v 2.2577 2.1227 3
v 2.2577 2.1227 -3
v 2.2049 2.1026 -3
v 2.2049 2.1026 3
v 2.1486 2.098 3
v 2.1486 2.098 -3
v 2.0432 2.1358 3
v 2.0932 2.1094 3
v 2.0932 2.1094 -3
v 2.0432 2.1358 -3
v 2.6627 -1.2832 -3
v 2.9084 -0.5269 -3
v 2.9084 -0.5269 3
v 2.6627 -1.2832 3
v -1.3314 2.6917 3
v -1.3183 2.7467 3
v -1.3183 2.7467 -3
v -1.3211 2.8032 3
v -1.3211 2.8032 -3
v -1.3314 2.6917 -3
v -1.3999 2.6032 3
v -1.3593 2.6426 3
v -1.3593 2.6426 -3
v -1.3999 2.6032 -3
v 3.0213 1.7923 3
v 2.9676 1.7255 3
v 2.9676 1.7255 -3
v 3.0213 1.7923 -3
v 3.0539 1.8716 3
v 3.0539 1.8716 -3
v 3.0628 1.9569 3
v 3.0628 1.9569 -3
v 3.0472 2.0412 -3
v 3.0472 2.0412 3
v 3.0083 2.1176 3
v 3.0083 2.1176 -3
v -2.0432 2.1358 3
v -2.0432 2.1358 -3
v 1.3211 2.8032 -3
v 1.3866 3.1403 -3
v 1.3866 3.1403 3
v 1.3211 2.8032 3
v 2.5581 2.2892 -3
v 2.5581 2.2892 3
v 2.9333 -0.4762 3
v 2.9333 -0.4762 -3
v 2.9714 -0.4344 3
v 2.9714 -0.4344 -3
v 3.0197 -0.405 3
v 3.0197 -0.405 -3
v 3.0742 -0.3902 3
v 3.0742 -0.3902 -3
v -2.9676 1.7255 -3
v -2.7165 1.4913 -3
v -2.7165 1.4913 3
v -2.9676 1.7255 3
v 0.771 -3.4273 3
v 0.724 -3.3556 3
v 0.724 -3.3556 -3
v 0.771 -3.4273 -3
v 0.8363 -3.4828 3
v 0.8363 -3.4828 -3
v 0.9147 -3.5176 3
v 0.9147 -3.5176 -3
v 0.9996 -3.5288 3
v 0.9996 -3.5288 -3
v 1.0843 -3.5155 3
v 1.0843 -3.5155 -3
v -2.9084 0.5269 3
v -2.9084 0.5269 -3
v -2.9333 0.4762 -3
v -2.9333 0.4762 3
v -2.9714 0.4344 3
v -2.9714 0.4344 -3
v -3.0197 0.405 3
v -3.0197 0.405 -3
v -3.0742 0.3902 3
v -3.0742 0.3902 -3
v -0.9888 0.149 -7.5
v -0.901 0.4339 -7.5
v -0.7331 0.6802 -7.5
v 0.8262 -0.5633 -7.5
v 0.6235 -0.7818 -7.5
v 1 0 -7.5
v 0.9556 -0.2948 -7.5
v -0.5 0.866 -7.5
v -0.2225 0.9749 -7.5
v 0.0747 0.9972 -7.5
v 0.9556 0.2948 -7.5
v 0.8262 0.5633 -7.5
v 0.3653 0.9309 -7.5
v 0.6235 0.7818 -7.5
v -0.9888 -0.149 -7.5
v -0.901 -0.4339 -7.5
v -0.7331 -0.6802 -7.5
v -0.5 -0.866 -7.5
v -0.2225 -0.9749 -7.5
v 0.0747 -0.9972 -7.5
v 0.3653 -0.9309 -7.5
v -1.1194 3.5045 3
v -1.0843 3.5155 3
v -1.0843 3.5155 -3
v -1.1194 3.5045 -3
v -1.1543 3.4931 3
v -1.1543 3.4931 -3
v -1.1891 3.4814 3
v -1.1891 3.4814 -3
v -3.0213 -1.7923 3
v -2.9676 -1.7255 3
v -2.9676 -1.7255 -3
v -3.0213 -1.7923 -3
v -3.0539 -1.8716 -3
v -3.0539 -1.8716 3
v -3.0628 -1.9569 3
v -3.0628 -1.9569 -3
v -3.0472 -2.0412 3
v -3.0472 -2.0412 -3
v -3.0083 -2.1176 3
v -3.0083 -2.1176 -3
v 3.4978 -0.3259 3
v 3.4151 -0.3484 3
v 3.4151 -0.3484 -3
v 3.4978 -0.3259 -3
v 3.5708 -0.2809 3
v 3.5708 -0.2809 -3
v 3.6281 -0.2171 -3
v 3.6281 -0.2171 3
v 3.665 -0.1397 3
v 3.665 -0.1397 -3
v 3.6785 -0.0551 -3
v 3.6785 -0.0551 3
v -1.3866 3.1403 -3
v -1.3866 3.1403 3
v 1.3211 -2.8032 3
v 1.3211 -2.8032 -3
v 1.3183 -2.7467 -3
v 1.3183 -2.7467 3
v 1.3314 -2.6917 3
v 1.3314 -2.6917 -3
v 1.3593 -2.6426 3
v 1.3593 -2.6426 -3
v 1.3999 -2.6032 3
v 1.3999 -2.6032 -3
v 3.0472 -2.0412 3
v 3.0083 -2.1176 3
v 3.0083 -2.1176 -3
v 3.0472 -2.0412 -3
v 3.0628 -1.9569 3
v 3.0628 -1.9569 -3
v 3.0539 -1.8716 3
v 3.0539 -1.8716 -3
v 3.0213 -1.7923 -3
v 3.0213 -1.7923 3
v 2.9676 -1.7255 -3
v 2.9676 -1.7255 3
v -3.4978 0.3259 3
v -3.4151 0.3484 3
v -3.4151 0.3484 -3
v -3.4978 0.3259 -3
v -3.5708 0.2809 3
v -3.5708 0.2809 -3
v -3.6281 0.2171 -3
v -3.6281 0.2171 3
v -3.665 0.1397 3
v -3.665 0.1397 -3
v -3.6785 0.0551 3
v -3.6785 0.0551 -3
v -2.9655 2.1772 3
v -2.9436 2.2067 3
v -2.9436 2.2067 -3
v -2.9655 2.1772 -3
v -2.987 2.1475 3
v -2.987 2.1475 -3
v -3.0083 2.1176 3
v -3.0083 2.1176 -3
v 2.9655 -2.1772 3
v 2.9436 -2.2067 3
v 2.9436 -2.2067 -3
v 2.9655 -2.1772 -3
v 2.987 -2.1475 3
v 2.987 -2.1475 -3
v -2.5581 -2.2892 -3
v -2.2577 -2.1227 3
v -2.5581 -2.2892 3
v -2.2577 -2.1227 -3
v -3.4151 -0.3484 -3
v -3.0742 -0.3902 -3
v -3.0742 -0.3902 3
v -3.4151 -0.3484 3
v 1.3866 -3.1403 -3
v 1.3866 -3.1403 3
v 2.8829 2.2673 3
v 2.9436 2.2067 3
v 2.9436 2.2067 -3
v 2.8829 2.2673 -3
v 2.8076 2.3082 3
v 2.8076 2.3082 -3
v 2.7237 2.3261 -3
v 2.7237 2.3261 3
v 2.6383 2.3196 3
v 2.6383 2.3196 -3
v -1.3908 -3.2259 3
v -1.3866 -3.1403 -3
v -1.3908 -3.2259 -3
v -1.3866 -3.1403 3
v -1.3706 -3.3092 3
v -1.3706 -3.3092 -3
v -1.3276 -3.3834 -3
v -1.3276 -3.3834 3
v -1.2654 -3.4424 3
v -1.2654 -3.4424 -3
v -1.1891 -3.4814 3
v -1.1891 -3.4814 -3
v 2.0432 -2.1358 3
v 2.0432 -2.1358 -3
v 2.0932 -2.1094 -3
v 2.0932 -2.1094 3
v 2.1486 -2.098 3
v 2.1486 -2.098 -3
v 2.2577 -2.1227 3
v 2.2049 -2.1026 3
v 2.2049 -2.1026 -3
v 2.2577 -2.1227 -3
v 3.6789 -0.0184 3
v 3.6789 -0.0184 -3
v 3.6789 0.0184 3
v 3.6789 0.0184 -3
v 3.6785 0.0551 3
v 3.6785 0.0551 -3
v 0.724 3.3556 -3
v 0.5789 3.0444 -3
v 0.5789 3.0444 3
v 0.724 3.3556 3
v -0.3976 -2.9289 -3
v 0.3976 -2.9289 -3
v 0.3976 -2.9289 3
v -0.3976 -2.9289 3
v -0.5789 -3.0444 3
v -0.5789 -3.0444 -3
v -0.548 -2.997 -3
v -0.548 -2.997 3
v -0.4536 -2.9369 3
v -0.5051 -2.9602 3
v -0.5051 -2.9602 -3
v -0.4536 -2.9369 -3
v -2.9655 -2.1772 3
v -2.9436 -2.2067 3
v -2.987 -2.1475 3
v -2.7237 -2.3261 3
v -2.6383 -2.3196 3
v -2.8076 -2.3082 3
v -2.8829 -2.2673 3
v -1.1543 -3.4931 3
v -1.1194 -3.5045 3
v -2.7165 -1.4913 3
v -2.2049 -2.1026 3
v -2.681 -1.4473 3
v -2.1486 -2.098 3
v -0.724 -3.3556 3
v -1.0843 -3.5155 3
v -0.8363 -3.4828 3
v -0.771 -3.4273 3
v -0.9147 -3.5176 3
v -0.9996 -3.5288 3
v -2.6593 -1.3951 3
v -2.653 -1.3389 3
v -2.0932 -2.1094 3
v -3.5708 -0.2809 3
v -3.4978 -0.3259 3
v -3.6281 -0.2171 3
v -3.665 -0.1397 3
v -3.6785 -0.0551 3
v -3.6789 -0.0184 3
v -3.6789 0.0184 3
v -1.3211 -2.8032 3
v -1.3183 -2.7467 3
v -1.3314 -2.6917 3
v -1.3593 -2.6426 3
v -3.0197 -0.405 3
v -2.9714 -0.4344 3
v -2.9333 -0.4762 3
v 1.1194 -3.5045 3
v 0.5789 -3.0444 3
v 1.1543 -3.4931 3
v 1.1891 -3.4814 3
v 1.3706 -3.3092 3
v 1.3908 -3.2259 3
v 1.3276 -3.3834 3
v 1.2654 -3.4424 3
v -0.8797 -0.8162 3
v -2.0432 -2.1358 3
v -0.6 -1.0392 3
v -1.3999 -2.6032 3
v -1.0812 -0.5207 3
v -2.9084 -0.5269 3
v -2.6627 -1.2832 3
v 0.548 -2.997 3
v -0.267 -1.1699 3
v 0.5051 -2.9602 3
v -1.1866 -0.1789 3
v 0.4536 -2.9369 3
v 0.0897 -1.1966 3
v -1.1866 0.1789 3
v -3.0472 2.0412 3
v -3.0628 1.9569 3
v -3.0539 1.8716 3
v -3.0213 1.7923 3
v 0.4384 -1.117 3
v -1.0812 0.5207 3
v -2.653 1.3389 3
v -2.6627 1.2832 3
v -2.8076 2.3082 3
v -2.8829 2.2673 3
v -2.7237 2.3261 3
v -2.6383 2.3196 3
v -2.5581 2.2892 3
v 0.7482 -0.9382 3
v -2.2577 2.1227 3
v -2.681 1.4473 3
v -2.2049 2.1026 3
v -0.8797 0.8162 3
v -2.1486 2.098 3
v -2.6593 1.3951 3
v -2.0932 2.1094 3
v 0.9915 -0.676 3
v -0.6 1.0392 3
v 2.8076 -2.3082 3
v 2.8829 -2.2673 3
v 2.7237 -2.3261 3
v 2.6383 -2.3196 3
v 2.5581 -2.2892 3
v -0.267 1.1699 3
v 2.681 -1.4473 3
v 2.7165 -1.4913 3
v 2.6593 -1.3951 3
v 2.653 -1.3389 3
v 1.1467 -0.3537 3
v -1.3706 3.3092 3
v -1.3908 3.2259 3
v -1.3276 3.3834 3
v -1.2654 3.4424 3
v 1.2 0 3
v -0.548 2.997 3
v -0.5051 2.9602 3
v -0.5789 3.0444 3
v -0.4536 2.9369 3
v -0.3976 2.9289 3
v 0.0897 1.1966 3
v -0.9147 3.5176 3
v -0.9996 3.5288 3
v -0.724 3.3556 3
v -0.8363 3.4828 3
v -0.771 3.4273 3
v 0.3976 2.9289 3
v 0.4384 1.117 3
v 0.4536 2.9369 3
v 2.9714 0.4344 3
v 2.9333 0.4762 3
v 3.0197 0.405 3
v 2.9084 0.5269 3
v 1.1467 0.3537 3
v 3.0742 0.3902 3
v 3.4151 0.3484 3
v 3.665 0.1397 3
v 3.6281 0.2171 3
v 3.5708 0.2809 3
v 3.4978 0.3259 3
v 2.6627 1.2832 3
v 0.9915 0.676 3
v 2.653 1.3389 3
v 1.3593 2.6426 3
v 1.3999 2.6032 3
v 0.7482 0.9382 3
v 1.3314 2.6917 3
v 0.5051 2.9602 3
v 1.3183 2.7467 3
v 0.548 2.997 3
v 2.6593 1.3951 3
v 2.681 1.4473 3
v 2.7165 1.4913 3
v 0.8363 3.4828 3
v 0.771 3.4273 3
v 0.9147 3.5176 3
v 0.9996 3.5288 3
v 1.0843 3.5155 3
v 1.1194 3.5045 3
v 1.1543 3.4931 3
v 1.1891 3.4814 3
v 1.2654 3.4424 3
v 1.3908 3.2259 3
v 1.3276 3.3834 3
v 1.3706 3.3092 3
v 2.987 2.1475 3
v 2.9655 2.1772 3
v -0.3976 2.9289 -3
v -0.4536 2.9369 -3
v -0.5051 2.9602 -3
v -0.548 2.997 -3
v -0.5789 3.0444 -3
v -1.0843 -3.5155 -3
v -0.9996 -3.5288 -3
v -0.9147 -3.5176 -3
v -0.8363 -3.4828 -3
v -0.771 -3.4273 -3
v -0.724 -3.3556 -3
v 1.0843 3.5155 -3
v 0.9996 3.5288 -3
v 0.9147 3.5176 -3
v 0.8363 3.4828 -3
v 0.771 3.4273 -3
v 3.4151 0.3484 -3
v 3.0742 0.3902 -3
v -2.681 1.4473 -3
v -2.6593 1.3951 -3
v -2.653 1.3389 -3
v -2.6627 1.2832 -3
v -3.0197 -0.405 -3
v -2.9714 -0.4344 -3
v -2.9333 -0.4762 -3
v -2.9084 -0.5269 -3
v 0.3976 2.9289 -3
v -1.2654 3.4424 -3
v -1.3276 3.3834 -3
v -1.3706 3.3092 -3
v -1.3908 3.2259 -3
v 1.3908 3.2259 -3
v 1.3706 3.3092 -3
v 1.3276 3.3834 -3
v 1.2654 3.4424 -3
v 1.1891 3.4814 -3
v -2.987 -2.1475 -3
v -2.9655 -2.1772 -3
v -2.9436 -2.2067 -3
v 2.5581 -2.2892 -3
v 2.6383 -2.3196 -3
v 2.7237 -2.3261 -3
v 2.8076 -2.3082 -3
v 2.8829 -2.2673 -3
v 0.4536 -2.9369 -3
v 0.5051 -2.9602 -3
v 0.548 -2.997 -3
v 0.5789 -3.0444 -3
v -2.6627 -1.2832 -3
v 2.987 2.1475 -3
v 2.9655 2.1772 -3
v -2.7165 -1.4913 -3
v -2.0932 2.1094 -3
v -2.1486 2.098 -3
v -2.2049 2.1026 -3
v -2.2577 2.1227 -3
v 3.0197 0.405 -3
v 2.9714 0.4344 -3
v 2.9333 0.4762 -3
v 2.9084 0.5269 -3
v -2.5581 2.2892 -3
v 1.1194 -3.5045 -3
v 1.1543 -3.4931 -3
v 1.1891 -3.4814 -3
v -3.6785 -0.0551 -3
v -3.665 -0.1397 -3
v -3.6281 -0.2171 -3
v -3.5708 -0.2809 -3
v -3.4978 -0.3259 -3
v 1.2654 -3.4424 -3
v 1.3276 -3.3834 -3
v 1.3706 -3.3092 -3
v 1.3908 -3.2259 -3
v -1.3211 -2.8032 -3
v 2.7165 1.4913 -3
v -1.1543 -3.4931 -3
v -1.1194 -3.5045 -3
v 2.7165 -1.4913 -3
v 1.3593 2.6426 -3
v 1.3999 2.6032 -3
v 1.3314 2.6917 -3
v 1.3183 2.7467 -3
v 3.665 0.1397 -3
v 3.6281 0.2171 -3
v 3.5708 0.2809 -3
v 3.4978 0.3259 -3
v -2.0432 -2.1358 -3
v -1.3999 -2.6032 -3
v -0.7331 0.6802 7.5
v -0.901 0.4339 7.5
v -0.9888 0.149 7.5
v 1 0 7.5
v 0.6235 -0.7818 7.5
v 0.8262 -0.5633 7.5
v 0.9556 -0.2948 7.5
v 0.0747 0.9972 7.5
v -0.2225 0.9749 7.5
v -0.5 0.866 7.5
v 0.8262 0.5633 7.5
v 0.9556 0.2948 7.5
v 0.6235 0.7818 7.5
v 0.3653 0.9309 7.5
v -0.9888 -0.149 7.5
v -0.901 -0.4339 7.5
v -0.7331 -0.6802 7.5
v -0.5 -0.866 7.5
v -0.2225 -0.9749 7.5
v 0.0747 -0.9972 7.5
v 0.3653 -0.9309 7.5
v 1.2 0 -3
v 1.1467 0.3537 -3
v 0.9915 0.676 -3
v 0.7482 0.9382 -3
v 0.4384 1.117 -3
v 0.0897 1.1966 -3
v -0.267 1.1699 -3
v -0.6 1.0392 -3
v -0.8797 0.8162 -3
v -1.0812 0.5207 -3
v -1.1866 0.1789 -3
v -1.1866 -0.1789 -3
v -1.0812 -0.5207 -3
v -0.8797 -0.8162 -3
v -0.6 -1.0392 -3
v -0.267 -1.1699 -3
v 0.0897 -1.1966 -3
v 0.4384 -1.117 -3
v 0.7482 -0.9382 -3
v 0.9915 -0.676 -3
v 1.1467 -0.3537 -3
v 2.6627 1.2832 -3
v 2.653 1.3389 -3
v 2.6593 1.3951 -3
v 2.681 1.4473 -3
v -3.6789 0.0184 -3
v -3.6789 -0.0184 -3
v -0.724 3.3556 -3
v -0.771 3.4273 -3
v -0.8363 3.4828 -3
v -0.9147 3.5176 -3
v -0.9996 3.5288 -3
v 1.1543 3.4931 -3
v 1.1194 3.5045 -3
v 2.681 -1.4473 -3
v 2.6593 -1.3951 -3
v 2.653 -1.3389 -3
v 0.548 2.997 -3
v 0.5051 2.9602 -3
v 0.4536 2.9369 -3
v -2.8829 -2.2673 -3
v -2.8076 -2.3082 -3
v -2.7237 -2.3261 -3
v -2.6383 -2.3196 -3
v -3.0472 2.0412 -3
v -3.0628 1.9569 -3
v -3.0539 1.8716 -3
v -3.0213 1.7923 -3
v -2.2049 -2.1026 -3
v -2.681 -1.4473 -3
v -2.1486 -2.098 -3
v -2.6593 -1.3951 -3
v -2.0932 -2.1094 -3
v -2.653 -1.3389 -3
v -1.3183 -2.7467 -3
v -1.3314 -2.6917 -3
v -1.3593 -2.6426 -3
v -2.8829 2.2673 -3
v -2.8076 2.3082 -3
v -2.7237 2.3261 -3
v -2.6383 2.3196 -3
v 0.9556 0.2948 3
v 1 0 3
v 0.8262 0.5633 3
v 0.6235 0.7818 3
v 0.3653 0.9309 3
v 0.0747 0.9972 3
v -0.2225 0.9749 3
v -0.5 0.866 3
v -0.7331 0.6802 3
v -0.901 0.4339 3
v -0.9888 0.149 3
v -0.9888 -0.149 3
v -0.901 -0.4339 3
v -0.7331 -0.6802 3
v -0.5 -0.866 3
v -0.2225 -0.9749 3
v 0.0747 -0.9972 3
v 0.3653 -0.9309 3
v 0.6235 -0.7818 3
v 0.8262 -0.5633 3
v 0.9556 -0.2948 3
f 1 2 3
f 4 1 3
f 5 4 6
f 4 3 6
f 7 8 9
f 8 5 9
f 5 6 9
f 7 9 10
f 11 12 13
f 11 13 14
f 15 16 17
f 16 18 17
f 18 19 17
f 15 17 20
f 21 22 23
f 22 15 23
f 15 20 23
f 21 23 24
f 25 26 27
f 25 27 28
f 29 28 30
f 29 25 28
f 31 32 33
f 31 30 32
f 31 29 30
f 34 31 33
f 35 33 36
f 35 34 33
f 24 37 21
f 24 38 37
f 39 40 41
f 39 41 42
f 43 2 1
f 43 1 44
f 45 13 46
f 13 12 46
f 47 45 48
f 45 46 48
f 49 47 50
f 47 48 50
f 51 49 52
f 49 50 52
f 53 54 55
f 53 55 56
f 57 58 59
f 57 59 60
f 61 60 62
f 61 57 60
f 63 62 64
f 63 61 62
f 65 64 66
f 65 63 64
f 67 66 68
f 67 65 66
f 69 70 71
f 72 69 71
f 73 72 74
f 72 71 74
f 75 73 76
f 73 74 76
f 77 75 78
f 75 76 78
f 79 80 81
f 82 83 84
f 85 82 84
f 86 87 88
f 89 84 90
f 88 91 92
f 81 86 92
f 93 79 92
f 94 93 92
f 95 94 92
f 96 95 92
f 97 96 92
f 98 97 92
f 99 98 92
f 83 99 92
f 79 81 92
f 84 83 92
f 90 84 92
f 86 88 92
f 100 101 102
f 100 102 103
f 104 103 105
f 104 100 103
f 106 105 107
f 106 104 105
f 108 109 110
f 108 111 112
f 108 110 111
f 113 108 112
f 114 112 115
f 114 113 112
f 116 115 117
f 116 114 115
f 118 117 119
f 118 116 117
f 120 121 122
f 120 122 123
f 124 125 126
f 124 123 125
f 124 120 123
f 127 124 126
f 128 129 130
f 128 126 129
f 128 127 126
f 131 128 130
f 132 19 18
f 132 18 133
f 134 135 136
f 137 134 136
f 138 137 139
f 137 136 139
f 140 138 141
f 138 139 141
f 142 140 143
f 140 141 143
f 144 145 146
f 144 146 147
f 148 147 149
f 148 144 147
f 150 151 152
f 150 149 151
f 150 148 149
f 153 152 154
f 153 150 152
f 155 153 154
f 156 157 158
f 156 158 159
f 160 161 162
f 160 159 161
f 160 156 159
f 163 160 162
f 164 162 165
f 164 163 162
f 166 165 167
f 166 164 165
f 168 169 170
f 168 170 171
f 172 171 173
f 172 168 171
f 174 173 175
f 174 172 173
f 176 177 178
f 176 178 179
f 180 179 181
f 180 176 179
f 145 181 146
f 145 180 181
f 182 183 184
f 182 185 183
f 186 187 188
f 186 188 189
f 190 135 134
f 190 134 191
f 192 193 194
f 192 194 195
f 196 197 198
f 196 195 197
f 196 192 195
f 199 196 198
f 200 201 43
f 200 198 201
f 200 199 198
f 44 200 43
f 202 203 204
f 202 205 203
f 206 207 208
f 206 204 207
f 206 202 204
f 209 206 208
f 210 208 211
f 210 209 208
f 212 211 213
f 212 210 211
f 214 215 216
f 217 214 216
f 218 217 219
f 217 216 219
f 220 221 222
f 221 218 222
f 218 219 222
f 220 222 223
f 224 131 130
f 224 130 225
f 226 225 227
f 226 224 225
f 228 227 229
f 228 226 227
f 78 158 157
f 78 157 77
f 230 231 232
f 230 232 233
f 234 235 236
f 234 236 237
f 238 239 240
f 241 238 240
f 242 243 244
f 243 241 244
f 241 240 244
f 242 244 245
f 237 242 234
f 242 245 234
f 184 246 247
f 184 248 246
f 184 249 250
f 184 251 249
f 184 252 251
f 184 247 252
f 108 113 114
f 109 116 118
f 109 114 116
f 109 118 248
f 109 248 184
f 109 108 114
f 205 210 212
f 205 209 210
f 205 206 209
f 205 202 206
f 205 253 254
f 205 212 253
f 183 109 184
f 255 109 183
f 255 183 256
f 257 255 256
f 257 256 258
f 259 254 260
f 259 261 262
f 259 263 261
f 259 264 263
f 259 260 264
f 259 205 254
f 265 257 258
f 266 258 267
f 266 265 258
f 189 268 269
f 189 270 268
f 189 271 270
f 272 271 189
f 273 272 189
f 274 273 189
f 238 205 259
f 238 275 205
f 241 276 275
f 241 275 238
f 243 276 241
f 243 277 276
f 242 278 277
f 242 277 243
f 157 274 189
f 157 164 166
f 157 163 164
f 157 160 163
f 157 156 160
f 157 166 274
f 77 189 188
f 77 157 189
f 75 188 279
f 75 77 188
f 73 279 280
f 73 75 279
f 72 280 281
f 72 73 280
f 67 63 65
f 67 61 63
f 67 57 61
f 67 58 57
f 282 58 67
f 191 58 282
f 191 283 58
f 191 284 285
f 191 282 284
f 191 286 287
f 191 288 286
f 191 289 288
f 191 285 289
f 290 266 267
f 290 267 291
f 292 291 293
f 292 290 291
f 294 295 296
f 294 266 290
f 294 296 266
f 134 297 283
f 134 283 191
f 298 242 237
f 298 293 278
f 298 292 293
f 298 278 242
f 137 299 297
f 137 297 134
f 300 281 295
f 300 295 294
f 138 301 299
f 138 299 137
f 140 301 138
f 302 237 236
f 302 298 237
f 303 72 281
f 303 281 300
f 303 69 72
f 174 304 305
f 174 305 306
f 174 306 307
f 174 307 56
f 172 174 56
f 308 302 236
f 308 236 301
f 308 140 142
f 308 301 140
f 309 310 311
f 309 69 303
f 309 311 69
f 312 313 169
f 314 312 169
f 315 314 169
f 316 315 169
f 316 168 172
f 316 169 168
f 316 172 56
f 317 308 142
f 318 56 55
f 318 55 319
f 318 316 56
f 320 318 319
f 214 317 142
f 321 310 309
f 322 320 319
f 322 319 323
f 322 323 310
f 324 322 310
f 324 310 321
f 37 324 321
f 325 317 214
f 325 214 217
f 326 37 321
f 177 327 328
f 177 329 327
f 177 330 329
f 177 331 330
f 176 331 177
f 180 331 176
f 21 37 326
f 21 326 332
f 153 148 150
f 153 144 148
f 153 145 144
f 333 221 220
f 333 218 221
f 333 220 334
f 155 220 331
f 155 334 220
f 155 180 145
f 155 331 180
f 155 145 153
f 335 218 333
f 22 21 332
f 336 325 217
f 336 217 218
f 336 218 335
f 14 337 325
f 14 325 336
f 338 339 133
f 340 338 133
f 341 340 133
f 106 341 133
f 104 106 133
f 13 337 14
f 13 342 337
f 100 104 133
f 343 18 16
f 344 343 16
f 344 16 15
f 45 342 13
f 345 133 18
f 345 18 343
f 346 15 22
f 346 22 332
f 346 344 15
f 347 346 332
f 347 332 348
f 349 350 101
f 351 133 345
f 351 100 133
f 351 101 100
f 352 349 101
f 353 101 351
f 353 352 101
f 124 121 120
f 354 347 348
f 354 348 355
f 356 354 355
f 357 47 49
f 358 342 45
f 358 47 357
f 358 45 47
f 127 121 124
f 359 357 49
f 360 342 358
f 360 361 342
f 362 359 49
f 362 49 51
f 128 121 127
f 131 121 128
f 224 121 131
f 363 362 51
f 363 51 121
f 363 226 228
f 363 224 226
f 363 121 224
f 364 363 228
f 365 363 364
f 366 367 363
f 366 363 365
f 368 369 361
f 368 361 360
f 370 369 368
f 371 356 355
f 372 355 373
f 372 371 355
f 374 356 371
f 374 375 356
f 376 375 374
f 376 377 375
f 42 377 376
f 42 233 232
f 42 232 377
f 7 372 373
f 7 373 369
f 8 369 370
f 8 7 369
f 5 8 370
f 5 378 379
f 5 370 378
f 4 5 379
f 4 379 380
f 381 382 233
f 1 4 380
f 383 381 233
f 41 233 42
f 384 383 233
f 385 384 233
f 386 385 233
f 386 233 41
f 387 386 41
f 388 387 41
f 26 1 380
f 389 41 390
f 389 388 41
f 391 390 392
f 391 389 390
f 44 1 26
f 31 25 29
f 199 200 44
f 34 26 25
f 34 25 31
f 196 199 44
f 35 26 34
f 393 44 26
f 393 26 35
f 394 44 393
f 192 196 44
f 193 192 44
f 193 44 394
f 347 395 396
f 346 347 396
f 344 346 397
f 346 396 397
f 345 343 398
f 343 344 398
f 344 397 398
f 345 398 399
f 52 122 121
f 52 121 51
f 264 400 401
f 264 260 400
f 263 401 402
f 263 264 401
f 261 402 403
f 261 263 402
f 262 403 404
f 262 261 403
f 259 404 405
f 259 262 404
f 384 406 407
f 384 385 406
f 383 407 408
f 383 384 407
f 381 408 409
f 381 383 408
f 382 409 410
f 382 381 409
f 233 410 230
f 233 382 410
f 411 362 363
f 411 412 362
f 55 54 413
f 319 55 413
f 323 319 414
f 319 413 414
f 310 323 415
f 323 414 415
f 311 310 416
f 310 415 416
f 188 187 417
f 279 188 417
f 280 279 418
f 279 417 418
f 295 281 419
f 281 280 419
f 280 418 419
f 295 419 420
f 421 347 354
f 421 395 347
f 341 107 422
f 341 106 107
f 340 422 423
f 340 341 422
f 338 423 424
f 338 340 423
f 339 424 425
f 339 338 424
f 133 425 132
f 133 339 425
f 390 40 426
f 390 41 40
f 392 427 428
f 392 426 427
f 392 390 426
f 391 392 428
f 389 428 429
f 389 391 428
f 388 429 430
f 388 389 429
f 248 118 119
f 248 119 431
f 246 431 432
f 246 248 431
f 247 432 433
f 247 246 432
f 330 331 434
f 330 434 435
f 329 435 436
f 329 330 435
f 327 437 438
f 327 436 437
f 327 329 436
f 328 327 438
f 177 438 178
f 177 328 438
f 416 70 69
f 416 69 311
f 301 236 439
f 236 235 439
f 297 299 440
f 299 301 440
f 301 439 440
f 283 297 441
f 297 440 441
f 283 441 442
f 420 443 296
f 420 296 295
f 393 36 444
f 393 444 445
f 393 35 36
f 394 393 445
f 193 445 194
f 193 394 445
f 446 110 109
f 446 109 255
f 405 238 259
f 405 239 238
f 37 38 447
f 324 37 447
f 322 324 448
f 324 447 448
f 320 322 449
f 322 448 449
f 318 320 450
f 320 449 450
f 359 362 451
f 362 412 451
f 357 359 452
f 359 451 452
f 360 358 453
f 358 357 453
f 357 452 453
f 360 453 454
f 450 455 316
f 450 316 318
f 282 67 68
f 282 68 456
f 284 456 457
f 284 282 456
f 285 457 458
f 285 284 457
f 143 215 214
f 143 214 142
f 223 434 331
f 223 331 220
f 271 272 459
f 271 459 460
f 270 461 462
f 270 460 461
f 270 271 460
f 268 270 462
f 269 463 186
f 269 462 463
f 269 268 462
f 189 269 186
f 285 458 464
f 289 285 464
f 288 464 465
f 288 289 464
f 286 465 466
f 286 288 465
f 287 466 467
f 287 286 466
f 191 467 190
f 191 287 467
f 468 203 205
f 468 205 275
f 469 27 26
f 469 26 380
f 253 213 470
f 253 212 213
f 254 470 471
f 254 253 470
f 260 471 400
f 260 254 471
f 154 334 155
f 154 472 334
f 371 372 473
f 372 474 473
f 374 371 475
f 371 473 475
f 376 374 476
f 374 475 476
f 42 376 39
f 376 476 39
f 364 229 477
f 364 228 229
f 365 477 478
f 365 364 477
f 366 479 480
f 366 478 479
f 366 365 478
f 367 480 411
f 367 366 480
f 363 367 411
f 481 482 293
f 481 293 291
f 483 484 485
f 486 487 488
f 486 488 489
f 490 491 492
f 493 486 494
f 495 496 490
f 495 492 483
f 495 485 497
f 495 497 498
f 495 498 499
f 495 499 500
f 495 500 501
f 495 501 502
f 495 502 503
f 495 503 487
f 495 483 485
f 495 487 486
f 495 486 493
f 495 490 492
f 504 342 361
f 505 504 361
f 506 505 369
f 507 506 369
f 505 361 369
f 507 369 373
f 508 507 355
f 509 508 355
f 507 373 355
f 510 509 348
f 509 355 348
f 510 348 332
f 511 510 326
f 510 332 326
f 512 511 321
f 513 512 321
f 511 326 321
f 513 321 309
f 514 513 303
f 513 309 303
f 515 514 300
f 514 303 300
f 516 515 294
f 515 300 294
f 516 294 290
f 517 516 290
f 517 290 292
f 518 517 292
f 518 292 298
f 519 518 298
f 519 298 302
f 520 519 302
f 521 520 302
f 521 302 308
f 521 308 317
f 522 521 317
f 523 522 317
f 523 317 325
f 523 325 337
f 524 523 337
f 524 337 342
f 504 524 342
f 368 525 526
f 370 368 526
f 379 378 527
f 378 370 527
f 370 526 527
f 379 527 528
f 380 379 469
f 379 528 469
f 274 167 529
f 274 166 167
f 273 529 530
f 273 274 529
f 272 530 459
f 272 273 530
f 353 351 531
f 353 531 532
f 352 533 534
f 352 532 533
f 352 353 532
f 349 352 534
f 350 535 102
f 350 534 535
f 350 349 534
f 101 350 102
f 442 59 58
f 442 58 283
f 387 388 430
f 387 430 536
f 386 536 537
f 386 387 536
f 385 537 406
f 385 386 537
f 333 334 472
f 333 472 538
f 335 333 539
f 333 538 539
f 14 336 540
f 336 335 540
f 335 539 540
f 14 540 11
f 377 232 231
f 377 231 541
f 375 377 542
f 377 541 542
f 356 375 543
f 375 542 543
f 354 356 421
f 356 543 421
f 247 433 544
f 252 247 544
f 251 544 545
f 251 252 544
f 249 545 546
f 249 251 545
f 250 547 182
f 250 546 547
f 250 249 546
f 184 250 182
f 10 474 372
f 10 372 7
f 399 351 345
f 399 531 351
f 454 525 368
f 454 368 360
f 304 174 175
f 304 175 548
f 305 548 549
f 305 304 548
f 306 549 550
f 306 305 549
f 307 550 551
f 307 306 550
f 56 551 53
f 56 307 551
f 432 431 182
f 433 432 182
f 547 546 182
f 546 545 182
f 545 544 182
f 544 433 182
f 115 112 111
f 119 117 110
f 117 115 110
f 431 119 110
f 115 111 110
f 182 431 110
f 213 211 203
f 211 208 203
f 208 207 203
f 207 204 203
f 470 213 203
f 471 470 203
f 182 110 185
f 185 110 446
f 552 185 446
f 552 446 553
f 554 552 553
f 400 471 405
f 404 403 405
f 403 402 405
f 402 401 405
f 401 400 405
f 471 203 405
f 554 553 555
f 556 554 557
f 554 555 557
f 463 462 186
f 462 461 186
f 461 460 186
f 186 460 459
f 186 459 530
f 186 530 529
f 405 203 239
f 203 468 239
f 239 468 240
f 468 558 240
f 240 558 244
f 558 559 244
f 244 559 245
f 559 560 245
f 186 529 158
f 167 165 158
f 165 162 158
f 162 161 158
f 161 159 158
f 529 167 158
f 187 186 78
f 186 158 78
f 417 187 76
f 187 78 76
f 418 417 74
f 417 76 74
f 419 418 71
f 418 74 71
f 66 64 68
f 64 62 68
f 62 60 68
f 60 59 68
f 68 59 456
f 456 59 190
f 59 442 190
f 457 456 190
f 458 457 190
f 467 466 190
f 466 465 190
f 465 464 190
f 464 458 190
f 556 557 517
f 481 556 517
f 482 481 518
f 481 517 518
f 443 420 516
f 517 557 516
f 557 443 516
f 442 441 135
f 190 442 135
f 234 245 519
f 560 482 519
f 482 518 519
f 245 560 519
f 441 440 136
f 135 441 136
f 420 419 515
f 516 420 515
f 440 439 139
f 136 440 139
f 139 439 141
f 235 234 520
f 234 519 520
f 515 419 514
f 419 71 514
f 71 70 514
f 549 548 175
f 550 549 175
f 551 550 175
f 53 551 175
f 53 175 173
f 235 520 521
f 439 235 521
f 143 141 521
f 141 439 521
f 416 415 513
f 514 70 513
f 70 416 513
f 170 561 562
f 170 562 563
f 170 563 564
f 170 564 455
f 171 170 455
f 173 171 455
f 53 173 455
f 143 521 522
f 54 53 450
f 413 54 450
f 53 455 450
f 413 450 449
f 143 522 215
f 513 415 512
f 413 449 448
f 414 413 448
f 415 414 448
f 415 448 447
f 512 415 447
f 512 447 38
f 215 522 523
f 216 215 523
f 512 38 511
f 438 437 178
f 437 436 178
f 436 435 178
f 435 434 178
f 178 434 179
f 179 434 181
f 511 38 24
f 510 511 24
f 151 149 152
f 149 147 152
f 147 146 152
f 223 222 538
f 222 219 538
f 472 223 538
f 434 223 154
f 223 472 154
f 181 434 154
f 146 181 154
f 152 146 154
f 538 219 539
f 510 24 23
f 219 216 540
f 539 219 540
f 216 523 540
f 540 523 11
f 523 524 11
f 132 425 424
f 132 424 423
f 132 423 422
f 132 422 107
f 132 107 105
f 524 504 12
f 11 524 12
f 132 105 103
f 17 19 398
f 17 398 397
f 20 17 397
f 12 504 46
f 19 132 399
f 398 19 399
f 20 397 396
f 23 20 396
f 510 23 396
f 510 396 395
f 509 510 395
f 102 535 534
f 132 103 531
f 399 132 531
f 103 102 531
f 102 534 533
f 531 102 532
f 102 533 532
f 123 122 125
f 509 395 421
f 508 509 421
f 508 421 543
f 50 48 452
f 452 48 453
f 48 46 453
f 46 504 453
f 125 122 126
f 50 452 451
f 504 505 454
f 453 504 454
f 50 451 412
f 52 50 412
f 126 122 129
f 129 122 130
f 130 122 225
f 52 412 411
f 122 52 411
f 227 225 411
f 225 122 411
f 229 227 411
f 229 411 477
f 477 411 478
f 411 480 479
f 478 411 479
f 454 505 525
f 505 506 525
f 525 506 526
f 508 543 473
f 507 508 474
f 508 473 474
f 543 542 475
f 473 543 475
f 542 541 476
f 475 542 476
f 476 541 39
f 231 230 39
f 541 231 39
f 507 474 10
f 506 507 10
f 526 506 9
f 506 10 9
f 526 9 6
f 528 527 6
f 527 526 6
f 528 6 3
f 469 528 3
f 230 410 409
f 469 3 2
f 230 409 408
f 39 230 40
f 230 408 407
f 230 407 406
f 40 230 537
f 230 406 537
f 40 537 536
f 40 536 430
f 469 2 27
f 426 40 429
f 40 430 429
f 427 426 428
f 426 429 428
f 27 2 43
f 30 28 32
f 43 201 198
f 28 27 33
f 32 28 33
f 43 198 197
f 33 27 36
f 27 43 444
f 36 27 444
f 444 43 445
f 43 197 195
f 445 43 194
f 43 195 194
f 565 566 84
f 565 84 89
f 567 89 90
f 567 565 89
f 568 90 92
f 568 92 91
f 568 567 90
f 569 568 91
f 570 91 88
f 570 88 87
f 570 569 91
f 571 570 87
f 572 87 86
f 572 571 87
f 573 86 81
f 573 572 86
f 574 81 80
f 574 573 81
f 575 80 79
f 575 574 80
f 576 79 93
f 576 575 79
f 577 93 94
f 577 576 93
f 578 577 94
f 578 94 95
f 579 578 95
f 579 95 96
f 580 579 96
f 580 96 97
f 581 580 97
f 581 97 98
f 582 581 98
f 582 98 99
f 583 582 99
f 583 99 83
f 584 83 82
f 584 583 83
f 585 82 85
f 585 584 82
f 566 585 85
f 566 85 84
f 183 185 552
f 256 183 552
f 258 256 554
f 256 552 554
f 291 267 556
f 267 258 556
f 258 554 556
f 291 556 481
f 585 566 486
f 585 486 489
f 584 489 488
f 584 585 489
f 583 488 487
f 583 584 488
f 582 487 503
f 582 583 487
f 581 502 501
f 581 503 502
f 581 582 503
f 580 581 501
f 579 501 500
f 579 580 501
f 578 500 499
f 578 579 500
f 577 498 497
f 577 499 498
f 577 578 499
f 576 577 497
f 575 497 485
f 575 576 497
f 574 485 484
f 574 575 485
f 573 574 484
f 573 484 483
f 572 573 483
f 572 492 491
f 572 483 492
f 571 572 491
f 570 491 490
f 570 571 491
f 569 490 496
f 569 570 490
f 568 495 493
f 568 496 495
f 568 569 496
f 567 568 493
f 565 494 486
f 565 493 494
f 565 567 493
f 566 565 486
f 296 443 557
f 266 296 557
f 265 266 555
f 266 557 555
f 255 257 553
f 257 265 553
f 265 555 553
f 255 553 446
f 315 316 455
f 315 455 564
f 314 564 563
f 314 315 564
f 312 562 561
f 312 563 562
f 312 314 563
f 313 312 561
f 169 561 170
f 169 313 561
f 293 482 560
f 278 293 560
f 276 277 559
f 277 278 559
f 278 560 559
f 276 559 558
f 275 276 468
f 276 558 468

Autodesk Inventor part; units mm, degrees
ref_plane "YZ Plane" through (0, 0, 0) normal (1, 0, 0) x (0, 1, 0)
ref_plane "XZ Plane" through (0, 0, 0) normal (0, 1, 0) x (-1, 0, 0)
ref_plane "XY Plane" through (0, 0, 0) normal (0, 0, 1) x (1, 0, 0)
sketch "Riemenscheibenskizze" plane through (0, 0, 0) normal (0, 0, 1) x (1, 0, 0)
  circle A0 centre (0, 0) radius 3.9789 construction
  circle A1 centre (0, 0) radius 3.6789
  circle A2 centre (0, 0) radius 2.9289
  line L0 (-0.8305, 3.5839) -> (-0.525, 2.9289)
  line L1 (-0.525, 2.9289) -> (0.525, 2.9289)
  line L2 (0.525, 2.9289) -> (0.8305, 3.5839)
  line L3 (0, 0) -> (0, 3.6789) construction
  point P0 (0, 2.9289)
  dimension "d0" = 7.9577
  dimension "d1" = 0.3
  dimension "d2" = 0.75
  dimension "d3" = 50
  dimension "d4" = 1.05
extrude "Grundkörper" add sketch "Riemenscheibenskizze" along normal mid plane 6 contours A2 | A1 L0 L1 L2 | L2 L1 L0 A1
extrude "Zahn" cut sketch "Riemenscheibenskizze" along normal through all both and the other way through all contours L2 L1 L0 A1 picked at (0, 3.4218)
fillet "Fillet" radius 0.2 2 edges at (0.525, 2.9289, 0) (-0.525, 2.9289, 0)
fillet "Fillet" radius 0.3 4 edges at (-0.8305, 3.5839, 1.5) (-0.8305, 3.5839, -1.5) (0.8305, 3.5839, 1.5) (0.8305, 3.5839, -1.5)
pattern_circular "Zähne" count 10 over 360 about axis through (0, 0, -10) along (0, 0, 1) of "Zahn", "Fillet"
feature "Flansch links" [suppressed]
feature "Flansch rechts" [suppressed]
sketch "Skizze2" plane through (0, 0, 3) normal (0, 0, 1) x (1, 0, 0)
  circle A0 centre (0, 0) radius 1
  circle A1 centre (0, 0) radius 1.2
  dimension "d17" = 2
  dimension "d22" = 2.4
extrude "Extrusion3" add sketch "Skizze2" along normal blind 4.5 and the other way blind 10.5 separate body contours A0
extrude "Extrusion4" cut sketch "Skizze2" against normal through all contours A0 | A1 bodies 1
equation "\"d1\" = da_a"
equation "\"d2\" = da_hg"
equation "\"d3\" = 2 * da_fi"
equation "\"d4\" = da_bw"
equation "\"d5\" = da_bf"
equation "\"d7\" = da_bf"
equation "\"d9\" = da_rb"
equation "\"d10\" = da_rt"
equation "\"da_pb\" = 2.5"
equation "\"da_fi\" = 25deg"
equation "\"da_hg\" = 0.75"
equation "\"da_bw\" = 1.05"
equation "\"da_rb\" = 0.2"
equation "\"da_rt\" = 0.3"
equation "\"da_a\" = 0.3"
equation "\"da_bf\" = 6"
equation "\"da_wf\" = 0.8"
equation "\"da_hf\" = 0.8"
properties part number "Synchrone Riemenscheibe2" material "Steel"
